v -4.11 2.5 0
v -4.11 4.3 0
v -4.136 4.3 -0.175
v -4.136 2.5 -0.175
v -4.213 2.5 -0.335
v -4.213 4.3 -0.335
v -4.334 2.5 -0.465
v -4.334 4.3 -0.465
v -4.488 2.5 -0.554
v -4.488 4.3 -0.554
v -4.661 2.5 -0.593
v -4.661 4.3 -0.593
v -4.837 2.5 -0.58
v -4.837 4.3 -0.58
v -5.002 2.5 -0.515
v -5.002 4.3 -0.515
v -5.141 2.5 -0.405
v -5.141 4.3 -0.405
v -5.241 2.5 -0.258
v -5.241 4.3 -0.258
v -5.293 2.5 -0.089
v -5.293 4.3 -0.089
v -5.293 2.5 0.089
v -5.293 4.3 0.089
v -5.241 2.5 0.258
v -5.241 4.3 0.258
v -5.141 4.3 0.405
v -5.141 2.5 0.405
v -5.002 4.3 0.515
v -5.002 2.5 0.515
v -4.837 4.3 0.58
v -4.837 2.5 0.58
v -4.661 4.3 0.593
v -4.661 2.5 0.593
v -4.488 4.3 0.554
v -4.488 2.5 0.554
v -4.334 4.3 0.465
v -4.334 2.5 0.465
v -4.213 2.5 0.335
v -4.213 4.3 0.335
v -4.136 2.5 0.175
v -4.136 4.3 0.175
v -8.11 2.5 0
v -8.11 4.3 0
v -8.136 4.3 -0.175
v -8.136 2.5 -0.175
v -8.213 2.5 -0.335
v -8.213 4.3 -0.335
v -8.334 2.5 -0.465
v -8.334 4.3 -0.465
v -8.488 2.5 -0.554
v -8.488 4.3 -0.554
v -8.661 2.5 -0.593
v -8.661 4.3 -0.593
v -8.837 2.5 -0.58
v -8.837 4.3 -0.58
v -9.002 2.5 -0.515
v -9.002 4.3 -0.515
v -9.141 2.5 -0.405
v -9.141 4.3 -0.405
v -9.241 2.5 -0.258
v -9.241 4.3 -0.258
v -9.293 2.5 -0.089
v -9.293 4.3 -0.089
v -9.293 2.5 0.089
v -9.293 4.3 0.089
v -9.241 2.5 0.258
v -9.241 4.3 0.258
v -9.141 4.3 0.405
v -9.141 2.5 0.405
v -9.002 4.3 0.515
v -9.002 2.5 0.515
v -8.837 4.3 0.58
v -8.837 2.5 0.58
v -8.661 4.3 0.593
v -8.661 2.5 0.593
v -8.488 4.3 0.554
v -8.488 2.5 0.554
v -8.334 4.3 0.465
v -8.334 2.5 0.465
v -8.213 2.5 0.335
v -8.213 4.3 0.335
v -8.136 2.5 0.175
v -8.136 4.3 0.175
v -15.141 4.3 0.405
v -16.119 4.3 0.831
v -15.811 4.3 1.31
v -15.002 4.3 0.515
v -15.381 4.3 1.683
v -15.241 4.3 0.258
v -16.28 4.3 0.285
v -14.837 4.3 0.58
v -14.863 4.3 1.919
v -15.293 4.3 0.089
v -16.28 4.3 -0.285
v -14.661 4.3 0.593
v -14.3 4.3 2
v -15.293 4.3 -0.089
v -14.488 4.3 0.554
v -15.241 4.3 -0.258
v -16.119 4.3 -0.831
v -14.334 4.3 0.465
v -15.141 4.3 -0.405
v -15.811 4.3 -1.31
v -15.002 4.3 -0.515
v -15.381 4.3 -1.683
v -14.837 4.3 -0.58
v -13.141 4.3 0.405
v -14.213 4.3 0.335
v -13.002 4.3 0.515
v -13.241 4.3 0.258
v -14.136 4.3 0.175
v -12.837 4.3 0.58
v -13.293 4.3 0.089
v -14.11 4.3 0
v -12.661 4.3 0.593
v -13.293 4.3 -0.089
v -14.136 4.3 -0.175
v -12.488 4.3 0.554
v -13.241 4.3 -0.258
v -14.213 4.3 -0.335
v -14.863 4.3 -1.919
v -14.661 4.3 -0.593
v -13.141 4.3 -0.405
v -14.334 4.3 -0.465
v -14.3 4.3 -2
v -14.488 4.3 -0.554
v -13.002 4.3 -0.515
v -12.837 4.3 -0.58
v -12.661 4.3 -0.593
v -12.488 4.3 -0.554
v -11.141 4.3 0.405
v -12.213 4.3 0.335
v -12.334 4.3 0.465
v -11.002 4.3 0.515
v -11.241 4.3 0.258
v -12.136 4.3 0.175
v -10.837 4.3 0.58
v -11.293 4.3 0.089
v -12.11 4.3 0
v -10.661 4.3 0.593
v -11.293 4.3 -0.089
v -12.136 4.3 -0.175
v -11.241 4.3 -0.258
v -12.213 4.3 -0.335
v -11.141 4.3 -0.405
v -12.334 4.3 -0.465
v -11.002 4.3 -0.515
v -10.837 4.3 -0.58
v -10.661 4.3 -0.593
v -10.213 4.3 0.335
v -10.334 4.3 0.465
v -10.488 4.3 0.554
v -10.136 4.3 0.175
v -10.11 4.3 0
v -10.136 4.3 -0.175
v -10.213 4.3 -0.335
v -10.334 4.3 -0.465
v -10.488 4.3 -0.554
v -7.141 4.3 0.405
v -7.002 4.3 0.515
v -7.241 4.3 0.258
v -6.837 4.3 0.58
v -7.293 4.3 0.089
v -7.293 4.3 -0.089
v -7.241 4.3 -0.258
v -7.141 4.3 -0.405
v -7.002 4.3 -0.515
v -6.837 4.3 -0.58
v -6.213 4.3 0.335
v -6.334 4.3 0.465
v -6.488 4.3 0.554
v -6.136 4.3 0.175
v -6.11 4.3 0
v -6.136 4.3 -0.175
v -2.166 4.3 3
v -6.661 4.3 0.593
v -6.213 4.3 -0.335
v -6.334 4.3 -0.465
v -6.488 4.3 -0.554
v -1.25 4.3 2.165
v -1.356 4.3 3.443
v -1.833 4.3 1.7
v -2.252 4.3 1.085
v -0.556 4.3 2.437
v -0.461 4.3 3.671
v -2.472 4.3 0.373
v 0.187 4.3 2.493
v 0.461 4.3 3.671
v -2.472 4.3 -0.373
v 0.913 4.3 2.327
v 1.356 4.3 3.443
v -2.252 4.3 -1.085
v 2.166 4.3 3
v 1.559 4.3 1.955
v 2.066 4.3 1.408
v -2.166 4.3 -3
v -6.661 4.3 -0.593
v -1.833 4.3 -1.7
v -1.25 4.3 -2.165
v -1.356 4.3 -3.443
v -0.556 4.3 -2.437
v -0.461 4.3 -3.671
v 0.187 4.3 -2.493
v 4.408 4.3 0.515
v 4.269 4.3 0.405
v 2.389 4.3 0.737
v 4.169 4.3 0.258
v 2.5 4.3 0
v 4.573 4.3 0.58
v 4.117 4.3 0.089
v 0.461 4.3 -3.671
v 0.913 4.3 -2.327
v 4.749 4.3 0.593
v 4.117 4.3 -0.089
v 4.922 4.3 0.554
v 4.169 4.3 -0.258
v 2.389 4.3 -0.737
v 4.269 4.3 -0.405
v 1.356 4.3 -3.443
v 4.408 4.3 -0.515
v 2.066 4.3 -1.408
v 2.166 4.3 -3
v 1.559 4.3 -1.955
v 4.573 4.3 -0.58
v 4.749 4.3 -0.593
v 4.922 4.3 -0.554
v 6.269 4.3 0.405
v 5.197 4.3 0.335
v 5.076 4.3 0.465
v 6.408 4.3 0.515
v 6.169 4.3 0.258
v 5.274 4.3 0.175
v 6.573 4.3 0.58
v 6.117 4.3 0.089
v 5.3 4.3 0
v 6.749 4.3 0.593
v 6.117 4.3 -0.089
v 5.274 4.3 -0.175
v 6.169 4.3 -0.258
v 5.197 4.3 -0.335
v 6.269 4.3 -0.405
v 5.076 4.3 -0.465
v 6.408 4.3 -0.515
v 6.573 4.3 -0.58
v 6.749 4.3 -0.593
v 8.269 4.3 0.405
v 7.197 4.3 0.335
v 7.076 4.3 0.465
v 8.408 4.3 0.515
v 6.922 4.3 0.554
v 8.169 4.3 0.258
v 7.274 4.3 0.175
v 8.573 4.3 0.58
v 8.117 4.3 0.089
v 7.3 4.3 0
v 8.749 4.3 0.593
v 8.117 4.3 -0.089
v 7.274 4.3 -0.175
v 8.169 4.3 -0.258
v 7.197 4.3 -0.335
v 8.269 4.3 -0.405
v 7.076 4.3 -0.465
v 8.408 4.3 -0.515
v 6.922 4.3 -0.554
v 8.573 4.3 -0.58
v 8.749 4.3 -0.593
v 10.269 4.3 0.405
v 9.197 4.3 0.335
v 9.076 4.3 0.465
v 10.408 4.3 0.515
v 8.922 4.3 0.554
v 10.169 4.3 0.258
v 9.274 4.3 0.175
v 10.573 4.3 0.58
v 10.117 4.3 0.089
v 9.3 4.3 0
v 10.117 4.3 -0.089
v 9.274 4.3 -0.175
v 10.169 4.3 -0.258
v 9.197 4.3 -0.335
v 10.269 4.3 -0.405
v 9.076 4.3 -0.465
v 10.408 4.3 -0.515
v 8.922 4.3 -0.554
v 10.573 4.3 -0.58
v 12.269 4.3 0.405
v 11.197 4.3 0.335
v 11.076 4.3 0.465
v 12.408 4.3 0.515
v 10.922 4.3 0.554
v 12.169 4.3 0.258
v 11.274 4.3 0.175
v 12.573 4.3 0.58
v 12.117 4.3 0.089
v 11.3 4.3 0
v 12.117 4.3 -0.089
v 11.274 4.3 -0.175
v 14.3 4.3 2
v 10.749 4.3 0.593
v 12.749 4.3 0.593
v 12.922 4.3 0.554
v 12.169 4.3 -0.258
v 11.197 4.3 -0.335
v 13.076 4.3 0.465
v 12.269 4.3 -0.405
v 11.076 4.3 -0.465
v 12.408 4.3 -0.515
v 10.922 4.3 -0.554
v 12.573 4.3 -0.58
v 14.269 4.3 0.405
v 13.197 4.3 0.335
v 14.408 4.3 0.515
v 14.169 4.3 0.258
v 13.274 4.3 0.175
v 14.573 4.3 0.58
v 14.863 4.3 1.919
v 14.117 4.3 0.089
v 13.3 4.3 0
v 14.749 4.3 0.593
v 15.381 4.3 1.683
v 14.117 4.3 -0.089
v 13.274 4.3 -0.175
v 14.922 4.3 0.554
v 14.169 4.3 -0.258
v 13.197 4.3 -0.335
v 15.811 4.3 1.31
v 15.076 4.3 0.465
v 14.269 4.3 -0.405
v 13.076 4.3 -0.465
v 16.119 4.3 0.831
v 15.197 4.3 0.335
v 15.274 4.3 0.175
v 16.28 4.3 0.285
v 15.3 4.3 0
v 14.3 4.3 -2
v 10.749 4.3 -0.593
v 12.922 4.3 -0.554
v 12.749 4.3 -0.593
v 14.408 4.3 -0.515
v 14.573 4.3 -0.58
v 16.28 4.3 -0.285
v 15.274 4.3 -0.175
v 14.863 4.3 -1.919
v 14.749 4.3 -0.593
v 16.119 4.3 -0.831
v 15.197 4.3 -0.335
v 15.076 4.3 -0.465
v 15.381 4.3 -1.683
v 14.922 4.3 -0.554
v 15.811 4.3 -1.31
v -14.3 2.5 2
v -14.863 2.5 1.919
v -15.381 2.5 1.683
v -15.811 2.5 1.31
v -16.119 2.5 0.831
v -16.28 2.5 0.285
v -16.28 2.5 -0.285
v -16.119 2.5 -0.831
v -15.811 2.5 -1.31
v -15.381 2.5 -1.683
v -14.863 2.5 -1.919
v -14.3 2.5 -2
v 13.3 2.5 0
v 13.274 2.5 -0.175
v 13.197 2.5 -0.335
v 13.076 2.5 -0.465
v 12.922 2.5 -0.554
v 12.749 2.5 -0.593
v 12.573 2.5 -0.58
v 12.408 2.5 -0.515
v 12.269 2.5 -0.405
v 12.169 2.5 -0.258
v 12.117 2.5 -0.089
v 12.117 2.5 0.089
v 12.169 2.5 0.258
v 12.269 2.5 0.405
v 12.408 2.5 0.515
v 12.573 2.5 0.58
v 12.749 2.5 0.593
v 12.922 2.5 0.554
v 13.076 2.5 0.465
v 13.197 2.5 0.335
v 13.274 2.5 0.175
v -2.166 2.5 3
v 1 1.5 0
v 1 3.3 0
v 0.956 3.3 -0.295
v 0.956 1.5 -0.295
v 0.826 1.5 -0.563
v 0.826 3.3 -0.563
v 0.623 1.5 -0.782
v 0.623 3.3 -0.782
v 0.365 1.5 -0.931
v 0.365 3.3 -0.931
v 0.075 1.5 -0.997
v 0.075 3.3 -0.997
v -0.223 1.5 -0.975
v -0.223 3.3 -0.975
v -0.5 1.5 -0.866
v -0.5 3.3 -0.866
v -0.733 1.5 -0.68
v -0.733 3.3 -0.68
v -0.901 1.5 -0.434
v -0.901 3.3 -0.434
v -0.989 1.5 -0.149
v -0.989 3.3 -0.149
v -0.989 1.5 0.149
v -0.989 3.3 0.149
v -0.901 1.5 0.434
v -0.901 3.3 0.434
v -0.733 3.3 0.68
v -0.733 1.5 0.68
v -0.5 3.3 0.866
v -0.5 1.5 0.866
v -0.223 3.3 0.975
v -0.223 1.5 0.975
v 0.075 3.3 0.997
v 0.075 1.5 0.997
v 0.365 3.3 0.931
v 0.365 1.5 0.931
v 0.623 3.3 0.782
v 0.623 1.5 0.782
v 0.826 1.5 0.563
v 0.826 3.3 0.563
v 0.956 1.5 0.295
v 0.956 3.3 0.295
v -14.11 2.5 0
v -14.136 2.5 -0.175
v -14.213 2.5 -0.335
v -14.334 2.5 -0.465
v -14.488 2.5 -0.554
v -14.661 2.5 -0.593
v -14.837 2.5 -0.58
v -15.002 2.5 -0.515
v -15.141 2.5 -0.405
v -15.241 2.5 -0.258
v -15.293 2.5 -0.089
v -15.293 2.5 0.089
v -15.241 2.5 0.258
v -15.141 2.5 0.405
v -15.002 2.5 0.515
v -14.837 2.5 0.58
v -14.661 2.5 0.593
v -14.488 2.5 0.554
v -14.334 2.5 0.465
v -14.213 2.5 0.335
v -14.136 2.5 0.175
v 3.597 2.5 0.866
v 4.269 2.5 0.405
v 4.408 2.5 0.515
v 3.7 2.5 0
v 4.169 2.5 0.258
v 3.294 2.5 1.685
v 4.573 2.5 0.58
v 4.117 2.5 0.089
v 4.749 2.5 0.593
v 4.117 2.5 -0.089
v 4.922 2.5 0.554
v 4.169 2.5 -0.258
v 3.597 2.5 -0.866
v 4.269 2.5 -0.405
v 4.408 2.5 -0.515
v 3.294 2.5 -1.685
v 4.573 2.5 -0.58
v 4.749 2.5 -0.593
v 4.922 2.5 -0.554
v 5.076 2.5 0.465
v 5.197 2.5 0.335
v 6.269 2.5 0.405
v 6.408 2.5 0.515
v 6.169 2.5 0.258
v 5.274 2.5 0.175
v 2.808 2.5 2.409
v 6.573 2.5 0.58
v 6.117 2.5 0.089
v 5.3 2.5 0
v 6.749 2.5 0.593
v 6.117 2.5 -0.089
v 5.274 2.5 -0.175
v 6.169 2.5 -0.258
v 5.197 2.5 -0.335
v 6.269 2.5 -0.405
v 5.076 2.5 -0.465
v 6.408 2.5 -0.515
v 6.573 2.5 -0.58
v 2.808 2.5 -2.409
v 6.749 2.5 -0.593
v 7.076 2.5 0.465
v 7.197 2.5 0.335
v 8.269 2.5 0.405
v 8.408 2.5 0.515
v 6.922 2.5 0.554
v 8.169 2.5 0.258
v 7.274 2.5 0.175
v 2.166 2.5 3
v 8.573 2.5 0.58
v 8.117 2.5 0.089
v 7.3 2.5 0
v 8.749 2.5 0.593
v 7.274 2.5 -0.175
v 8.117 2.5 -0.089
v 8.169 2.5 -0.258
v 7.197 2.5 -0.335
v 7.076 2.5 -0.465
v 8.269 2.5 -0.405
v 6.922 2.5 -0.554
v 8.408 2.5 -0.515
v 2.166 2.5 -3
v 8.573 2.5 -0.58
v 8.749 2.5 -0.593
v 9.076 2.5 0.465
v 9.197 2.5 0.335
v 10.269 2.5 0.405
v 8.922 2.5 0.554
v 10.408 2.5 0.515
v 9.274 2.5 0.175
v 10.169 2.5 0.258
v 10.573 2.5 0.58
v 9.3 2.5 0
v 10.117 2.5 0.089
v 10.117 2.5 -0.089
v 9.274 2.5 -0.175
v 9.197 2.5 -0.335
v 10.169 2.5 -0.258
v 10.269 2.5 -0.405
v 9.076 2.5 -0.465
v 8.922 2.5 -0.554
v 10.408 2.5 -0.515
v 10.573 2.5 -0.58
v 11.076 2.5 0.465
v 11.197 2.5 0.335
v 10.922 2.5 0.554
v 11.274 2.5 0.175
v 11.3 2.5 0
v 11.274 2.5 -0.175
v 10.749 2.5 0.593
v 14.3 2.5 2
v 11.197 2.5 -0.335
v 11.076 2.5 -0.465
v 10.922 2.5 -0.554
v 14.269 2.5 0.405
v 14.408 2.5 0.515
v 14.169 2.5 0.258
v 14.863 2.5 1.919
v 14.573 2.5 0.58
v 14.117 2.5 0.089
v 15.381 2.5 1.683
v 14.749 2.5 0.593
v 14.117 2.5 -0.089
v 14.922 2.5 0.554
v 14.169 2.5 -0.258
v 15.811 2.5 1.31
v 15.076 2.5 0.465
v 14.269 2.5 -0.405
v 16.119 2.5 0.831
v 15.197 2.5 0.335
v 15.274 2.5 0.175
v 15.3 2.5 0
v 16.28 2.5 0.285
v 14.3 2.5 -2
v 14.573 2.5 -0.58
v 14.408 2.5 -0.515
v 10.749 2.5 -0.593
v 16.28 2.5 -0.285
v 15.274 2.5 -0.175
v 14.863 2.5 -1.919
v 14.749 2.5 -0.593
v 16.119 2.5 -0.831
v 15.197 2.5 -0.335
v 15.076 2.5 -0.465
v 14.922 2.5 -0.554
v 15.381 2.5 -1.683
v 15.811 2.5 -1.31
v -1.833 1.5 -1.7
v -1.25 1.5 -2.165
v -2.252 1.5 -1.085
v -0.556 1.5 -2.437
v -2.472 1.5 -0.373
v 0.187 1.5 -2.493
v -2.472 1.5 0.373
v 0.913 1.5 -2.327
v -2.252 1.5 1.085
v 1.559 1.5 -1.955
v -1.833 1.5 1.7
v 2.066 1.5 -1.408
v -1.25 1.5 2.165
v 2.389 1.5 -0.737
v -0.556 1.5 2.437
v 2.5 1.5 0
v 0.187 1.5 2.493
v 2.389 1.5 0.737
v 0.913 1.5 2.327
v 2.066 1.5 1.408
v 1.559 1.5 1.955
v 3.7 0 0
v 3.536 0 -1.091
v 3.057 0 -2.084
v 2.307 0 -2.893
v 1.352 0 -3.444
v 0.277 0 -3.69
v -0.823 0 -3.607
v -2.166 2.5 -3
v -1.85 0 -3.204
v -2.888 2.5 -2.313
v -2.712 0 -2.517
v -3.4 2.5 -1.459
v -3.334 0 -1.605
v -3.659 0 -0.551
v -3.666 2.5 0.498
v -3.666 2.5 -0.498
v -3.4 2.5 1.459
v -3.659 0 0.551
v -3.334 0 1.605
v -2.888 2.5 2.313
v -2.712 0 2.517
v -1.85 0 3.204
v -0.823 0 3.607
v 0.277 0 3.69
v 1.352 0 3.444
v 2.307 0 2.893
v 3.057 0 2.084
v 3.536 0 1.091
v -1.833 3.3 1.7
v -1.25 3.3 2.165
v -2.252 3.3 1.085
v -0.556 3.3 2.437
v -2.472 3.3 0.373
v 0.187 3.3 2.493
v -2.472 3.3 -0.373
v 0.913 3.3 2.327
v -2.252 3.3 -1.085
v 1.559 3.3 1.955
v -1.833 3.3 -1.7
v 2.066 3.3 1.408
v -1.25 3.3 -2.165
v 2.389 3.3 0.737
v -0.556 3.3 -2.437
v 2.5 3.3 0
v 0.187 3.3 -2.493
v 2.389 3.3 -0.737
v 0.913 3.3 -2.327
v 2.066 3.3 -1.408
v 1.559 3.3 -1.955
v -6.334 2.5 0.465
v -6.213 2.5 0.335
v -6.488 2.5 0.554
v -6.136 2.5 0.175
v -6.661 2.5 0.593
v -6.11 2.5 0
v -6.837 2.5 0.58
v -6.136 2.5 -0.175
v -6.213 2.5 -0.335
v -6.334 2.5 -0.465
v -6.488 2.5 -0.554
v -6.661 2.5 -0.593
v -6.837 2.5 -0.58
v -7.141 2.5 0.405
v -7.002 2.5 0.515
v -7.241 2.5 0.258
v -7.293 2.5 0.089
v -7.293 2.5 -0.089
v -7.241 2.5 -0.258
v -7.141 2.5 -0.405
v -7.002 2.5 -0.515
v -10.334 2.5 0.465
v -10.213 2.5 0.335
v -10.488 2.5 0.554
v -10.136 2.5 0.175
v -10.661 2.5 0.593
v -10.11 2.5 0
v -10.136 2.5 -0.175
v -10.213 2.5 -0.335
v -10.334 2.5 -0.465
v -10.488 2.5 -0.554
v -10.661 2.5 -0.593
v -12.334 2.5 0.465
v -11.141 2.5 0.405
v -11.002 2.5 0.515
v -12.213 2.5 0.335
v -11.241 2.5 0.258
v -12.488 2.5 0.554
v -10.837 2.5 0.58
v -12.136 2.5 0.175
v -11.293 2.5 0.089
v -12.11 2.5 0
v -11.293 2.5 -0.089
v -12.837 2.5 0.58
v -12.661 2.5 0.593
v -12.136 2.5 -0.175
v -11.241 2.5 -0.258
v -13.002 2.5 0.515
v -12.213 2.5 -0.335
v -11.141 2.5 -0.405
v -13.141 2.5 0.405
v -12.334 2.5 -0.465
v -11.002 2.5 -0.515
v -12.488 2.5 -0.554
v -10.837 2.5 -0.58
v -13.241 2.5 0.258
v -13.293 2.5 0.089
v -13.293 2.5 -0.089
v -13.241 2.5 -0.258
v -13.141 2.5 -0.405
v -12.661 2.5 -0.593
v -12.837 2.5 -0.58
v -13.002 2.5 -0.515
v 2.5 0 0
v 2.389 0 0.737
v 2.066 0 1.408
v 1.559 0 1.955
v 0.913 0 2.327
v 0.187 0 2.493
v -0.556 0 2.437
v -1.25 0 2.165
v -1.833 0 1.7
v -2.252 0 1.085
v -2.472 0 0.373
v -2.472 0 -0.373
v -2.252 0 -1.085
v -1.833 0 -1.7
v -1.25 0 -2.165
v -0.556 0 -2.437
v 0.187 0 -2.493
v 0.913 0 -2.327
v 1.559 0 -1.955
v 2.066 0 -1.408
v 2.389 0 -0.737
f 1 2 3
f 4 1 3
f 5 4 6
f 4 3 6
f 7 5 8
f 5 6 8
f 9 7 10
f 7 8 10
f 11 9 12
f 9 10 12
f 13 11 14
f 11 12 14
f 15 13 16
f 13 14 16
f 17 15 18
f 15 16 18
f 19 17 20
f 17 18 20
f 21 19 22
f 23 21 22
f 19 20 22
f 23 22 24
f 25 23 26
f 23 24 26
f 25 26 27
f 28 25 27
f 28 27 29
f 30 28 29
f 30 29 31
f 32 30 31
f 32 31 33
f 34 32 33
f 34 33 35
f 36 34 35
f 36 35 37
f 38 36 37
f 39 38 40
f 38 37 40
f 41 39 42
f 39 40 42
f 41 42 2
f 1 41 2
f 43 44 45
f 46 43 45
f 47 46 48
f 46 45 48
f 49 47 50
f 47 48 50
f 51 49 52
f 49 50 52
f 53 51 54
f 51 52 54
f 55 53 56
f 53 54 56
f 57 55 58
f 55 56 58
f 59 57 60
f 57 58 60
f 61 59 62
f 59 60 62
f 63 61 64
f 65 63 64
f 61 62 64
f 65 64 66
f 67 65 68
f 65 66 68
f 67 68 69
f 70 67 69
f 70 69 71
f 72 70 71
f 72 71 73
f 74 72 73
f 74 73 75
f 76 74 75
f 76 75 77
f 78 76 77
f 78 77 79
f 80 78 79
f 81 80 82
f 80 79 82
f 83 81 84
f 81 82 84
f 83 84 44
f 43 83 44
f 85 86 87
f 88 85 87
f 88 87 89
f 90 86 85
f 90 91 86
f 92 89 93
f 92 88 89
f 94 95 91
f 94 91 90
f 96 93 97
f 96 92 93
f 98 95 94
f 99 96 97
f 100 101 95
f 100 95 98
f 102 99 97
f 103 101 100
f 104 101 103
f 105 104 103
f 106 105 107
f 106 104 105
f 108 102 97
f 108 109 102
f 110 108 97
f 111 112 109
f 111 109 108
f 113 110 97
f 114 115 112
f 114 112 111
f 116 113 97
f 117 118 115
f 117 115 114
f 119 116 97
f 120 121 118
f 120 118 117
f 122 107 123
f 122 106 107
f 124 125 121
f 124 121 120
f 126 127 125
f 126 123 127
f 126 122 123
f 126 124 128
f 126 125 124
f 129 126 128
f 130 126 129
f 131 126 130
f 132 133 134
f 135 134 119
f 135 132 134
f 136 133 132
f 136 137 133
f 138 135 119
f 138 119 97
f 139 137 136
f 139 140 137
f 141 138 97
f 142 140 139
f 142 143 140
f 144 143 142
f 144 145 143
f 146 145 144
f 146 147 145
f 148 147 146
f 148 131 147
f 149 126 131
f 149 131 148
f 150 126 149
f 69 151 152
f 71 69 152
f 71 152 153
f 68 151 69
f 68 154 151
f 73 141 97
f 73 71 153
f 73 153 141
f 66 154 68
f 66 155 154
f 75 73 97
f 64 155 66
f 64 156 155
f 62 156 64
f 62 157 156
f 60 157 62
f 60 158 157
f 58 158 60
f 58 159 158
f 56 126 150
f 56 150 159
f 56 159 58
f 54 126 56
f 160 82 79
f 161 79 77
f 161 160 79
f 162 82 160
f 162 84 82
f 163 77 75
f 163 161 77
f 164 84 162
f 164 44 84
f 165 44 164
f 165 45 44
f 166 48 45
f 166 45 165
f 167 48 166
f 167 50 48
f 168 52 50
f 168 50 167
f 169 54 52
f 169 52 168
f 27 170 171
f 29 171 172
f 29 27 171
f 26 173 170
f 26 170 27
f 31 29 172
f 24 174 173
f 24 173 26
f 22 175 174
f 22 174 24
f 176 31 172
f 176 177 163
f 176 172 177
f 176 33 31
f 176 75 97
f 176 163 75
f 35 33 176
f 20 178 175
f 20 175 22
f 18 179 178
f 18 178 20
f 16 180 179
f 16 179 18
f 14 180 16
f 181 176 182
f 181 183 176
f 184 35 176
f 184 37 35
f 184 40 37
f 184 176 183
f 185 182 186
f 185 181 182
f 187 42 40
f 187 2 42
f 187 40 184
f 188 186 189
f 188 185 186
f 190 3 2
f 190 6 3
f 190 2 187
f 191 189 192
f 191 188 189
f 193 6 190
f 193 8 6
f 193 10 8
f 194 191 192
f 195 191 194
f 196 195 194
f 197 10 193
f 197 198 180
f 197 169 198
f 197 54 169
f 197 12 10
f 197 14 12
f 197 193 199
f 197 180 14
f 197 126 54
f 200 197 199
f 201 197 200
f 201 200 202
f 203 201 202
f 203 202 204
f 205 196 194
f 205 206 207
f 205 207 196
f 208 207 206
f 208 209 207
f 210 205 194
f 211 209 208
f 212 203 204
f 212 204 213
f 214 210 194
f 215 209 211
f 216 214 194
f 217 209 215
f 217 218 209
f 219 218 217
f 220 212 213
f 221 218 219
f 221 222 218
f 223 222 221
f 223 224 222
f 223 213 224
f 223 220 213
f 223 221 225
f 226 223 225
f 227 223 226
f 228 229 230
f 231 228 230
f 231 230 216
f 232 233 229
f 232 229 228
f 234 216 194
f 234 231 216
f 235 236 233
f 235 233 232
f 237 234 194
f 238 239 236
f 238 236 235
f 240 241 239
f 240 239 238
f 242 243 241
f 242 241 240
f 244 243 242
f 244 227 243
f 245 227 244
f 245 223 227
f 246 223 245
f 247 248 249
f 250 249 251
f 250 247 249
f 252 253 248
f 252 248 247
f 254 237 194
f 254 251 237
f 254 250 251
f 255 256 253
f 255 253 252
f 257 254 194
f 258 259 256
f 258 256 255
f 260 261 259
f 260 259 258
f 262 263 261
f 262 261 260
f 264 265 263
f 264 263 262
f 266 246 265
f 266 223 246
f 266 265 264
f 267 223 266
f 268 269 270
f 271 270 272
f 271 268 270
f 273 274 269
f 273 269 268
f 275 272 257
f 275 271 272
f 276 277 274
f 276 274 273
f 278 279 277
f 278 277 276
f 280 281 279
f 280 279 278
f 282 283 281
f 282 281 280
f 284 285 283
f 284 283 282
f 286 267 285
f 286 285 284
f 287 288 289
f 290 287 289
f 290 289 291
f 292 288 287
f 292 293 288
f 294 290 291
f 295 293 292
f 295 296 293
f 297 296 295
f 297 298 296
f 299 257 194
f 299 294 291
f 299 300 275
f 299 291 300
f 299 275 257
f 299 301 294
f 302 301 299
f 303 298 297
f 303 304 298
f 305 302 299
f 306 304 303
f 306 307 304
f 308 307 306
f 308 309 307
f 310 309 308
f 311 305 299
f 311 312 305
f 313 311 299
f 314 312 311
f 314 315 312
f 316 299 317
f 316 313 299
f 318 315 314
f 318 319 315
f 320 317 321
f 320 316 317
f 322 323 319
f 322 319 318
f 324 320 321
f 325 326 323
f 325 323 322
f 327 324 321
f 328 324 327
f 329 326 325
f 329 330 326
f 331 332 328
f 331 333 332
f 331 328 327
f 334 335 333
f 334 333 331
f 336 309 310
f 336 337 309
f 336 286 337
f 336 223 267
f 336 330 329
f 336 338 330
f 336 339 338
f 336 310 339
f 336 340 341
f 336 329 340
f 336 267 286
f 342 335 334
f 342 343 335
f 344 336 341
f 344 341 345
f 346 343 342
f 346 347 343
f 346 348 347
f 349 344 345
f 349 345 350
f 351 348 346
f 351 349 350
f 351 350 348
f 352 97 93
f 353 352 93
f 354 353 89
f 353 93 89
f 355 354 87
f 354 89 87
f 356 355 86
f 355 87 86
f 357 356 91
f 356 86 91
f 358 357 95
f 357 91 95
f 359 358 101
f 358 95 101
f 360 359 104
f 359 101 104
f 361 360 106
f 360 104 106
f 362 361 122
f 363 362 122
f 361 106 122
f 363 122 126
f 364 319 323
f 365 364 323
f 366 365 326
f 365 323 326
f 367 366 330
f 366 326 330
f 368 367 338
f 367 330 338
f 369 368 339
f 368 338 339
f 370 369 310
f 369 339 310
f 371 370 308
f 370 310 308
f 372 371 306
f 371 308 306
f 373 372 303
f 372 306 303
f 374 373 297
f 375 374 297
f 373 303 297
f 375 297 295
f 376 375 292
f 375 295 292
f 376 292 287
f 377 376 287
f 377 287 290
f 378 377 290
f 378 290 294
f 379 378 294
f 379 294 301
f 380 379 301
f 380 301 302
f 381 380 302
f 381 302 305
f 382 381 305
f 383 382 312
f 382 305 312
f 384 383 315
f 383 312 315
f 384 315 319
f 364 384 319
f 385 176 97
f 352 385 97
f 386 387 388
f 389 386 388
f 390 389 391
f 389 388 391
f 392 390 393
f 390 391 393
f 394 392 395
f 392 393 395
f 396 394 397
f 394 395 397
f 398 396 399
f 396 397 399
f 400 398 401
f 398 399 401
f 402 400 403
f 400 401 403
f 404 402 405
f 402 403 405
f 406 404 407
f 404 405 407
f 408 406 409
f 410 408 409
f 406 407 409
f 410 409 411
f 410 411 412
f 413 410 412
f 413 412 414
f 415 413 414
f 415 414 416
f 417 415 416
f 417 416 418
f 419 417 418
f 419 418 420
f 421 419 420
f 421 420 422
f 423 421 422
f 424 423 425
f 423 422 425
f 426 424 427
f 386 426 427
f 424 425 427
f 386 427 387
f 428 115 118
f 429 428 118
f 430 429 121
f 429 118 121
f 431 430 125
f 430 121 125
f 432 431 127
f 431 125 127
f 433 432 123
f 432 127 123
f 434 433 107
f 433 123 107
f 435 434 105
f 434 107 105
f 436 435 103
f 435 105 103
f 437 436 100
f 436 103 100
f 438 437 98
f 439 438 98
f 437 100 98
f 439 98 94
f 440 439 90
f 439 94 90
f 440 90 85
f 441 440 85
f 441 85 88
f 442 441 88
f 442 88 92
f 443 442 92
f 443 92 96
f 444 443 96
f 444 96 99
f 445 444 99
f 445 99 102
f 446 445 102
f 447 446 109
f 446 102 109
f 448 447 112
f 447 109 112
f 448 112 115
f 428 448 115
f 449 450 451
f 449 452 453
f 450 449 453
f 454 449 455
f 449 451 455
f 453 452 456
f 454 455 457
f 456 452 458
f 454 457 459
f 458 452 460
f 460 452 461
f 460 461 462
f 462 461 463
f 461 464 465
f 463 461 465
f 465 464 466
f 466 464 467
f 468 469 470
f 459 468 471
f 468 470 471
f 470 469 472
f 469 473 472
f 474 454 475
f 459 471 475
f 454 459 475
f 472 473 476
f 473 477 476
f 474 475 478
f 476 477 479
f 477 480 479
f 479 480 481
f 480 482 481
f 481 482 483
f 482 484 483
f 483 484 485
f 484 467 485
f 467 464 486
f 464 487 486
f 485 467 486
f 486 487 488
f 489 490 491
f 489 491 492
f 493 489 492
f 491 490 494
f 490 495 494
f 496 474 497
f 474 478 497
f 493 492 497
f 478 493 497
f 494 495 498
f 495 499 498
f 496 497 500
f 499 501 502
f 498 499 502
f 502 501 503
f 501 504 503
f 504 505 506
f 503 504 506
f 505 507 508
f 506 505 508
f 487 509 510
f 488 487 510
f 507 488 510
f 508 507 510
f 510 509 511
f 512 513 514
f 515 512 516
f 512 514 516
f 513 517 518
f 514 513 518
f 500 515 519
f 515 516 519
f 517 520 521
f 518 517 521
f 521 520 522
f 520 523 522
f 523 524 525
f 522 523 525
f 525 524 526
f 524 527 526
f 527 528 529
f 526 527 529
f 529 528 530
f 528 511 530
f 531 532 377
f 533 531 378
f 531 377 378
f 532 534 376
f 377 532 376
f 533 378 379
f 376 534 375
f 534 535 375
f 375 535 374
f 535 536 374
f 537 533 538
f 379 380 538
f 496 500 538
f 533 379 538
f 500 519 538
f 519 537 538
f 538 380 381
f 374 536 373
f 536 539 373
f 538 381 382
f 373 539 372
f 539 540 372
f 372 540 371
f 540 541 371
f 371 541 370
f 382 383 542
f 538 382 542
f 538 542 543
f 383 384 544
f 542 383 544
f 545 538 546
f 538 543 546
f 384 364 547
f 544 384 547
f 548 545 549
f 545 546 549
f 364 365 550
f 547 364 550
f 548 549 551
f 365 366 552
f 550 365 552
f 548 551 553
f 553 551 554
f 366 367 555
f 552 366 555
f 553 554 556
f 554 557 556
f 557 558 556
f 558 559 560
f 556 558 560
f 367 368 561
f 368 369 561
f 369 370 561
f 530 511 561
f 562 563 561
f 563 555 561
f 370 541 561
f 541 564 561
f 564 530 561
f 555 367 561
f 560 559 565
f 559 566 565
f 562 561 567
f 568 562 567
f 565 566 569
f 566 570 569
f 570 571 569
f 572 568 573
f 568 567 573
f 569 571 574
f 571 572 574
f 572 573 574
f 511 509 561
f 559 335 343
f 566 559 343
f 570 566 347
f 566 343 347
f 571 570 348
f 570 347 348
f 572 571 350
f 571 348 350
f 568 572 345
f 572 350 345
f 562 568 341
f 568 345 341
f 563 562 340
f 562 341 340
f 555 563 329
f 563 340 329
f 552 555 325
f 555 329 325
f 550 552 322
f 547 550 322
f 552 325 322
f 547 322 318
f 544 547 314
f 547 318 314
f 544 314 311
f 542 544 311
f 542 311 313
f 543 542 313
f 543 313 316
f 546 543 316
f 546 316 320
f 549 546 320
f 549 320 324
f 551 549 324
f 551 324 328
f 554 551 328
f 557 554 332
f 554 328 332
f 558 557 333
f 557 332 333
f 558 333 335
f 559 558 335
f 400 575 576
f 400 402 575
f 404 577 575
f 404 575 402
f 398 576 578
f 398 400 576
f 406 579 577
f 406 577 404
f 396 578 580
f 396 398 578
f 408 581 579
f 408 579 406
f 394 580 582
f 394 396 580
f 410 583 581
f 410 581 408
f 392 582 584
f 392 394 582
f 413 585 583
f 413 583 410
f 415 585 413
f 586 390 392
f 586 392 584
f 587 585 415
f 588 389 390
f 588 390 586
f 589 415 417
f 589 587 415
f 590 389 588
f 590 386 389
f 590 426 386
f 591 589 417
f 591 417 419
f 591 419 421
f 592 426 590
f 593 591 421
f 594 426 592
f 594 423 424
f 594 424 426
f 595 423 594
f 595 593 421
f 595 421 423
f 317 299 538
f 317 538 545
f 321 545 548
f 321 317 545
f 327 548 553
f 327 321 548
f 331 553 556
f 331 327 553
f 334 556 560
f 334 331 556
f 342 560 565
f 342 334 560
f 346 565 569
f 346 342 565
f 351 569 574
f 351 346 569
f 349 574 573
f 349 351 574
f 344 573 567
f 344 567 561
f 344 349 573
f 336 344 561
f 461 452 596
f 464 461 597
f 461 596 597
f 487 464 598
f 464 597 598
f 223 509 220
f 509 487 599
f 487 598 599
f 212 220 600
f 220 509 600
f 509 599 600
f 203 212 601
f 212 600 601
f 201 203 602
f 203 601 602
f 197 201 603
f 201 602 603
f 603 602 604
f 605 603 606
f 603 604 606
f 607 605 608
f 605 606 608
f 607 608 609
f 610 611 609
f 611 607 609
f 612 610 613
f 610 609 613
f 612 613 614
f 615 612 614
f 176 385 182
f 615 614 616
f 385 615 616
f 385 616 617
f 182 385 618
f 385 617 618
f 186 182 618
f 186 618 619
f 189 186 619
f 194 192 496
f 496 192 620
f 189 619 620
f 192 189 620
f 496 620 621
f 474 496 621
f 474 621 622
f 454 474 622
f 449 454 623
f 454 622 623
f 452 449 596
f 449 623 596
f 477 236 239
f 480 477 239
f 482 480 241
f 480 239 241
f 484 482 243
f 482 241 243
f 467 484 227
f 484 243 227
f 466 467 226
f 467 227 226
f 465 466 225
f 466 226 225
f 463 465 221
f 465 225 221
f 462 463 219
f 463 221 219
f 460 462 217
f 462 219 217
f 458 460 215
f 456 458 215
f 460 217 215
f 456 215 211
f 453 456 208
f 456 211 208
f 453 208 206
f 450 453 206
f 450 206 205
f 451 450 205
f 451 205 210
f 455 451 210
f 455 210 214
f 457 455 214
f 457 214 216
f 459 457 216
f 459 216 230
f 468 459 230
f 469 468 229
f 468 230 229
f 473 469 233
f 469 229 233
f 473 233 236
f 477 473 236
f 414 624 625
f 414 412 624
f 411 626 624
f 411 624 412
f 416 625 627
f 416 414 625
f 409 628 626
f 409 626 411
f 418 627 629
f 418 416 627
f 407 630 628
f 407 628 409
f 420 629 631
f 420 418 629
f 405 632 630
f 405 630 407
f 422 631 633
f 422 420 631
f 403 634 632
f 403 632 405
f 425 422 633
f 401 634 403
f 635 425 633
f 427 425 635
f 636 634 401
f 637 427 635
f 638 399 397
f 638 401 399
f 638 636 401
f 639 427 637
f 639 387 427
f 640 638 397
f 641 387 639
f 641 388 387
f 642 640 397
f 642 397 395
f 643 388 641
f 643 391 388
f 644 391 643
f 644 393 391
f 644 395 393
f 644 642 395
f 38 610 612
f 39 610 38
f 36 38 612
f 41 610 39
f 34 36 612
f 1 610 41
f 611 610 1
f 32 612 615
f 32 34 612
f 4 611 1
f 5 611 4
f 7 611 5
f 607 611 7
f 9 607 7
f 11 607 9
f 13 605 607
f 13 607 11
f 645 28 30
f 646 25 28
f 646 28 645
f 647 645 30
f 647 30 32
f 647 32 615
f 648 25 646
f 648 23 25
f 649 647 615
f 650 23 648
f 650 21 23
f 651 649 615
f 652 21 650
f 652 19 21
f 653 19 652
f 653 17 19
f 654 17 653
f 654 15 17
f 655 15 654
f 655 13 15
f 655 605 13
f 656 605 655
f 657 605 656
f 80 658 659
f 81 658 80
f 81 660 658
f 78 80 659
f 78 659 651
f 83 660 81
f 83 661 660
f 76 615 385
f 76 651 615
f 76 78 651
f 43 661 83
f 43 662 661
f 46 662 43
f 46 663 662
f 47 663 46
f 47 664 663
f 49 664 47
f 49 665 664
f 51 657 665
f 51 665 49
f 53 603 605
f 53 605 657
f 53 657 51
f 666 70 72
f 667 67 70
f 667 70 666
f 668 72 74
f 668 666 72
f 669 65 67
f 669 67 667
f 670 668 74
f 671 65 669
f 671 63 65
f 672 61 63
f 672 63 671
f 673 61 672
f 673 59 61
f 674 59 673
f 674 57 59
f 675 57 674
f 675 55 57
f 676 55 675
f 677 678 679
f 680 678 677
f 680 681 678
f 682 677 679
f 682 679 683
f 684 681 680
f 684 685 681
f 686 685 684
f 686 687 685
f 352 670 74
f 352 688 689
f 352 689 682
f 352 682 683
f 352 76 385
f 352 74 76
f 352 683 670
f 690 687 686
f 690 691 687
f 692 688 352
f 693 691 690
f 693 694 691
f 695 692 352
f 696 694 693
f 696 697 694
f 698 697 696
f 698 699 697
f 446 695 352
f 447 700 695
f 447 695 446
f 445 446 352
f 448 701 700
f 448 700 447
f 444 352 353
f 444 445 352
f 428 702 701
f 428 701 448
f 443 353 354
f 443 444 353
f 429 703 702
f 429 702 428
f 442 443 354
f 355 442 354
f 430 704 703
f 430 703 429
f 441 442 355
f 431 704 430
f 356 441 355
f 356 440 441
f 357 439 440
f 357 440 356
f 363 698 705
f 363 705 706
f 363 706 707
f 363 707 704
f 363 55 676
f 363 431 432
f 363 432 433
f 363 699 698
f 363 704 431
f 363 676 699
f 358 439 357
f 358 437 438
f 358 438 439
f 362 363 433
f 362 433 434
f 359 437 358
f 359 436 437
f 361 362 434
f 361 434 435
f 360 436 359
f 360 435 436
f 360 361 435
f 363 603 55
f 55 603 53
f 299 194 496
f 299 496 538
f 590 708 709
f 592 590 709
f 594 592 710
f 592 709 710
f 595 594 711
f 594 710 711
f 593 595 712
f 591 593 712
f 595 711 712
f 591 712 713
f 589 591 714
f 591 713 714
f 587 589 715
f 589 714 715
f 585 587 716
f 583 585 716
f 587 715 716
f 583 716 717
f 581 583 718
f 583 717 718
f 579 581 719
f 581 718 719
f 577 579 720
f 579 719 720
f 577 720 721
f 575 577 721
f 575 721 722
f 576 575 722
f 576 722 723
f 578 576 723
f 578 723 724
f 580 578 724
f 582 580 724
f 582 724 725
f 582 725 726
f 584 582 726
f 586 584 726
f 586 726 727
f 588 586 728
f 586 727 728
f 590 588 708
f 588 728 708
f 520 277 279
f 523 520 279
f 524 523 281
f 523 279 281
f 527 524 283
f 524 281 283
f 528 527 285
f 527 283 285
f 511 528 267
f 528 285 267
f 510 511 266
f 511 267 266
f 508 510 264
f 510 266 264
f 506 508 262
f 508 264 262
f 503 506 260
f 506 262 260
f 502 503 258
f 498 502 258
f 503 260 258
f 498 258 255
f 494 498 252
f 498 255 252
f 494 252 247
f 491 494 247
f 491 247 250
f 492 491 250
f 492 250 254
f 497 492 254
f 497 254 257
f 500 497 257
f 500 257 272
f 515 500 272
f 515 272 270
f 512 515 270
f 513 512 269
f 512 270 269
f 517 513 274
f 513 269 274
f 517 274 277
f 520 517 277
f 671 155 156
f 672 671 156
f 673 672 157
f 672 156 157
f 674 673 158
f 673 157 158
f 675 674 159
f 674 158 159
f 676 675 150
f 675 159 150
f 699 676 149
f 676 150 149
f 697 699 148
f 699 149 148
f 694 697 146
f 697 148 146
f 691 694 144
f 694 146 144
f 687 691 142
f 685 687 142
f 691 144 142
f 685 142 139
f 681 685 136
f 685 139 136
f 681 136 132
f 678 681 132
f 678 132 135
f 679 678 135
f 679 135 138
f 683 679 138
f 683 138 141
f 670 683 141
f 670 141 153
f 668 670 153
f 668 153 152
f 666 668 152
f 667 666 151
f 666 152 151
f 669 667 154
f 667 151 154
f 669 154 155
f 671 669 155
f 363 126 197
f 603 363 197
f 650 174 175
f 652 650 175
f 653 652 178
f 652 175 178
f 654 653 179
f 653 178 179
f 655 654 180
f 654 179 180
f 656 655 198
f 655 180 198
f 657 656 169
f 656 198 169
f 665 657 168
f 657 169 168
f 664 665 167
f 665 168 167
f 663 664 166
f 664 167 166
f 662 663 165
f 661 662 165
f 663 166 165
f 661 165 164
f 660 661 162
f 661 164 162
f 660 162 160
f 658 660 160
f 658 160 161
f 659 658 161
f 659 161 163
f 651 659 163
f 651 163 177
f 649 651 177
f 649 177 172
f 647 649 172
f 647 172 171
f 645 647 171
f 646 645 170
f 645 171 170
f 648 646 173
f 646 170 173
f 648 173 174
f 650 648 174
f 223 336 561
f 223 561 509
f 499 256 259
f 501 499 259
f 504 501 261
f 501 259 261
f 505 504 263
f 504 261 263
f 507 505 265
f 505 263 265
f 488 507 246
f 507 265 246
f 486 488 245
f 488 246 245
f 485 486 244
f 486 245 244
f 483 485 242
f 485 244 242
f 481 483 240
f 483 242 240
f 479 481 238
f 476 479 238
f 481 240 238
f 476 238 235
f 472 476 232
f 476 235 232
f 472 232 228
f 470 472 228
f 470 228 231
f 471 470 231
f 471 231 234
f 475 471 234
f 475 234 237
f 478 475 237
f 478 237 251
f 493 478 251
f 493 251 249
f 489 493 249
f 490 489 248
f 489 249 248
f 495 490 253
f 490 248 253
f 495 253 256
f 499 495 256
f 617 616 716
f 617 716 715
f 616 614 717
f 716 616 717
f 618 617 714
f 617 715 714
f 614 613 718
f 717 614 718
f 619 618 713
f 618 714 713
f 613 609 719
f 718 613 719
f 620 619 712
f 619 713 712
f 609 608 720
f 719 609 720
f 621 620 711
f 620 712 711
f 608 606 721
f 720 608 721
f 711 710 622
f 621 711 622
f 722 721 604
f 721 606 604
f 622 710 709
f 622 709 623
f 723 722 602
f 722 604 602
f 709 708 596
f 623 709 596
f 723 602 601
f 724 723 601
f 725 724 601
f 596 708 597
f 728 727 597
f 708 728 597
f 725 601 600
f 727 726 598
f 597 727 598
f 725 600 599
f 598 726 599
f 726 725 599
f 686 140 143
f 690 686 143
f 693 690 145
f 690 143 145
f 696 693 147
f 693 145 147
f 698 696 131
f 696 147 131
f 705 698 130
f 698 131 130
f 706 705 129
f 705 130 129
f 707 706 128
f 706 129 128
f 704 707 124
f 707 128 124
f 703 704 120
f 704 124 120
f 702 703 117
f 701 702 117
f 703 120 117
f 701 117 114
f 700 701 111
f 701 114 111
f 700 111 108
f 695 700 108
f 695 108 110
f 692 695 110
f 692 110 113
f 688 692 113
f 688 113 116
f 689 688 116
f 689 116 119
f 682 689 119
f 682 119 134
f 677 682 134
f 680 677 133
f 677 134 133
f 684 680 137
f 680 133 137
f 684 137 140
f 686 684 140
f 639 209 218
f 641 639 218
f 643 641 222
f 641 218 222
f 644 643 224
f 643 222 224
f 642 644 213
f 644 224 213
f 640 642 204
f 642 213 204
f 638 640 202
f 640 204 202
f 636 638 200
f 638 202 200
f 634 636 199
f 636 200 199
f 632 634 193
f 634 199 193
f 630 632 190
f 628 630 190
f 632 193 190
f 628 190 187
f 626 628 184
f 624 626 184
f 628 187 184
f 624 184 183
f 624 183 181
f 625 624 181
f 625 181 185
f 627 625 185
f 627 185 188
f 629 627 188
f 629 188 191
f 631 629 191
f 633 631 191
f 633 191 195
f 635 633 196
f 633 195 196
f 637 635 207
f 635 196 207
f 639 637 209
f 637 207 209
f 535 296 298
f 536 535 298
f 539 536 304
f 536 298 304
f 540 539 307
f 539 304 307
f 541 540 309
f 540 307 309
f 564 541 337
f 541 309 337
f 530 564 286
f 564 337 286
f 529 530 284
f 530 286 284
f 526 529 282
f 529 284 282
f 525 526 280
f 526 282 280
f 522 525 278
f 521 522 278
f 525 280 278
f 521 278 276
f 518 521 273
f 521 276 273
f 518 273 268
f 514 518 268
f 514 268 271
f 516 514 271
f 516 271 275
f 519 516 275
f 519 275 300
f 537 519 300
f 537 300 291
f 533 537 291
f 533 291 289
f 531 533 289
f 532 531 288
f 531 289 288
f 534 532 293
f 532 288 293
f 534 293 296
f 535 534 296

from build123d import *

# Parameters (mm, degrees)
CROQUIS1_R              = 3.7
SALIENTE_EXTRUIR2_DEPTH = 4.3
CROQUIS2_R              = 2.5
CORTAR_EXTRUIR1_DEPTH   = 1.5
CROQUIS3_R              = 2.5
CORTAR_EXTRUIR2_DEPTH   = 1
CROQUIS4_R              = 1
CORTAR_EXTRUIR3_DEPTH   = 1.8
SALIENTE_EXTRUIR3_DEPTH = 1.8
CROQUIS6_R              = 0.595
CORTAR_EXTRUIR4_DEPTH   = 1.8


with BuildPart() as part:
    # Croquis1 → Saliente-Extruir2 (new body)
    with BuildSketch(Plane(origin=(0, 0, 0), x_dir=(1, 0, 0), z_dir=(0, 1, 0))):
        Circle(CROQUIS1_R)
    extrude(amount=SALIENTE_EXTRUIR2_DEPTH)

    # Croquis2 → Cortar-Extruir1 (cut)
    with BuildSketch(Plane.XZ):
        Circle(CROQUIS2_R)
    extrude(amount=-CORTAR_EXTRUIR1_DEPTH, mode=Mode.SUBTRACT)

    # Croquis3 → Cortar-Extruir2 (cut)
    with BuildSketch(Plane(origin=(0, 4.3, 0), x_dir=(1, 0, 0), z_dir=(0, 1, 0))):
        Circle(CROQUIS3_R)
    extrude(amount=-CORTAR_EXTRUIR2_DEPTH, mode=Mode.SUBTRACT)

    # Croquis4 → Cortar-Extruir3 (cut)
    with BuildSketch(Plane(origin=(0, 3.3, 0), x_dir=(1, 0, 0), z_dir=(0, 1, 0))):
        Circle(CROQUIS4_R)
    extrude(amount=-CORTAR_EXTRUIR3_DEPTH, mode=Mode.SUBTRACT)

    # Croquis5 → Saliente-Extruir3 (add)
    with BuildSketch(Plane(origin=(0, 4.3, 0), x_dir=(1, 0, 0), z_dir=(0, 1, 0))):
        with BuildLine():
            Line((-2.16564, 3.000000565), (-3.120237459, 0))
            Line((-3.120237459, 0), (-2.16564, -3.000000565))
            Line((-2.16564, -3.000000565), (-14.3, -2))
            ThreePointArc((-14.3, -2), (-16.3, 0), (-14.3, 2))
            Line((-14.3, 2), (-2.16564, 3.000000565))
        make_face()
        with BuildLine():
            Line((3.120237459, 0), (2.16564, -3.000000565))
            Line((2.16564, -3.000000565), (14.3, -2))
            ThreePointArc((14.3, -2), (16.3, 0), (14.3, 2))
            Line((14.3, 2), (2.16564, 3.000000565))
            Line((2.16564, 3.000000565), (3.120237459, 0))
        make_face()
    extrude(amount=-SALIENTE_EXTRUIR3_DEPTH)

    # Croquis6 → Cortar-Extruir4 (cut)
    with BuildSketch(Plane(origin=(0, 4.3, 0), x_dir=(1, 0, 0), z_dir=(0, 1, 0))):
        with Locations((-14.705, 0)):
            Circle(CROQUIS6_R)
        with Locations((-12.705, 0)):
            Circle(CROQUIS6_R)
        with Locations((-10.705, 0)):
            Circle(CROQUIS6_R)
        with Locations((-8.705, 0)):
            Circle(CROQUIS6_R)
        with Locations((-6.705, 0)):
            Circle(CROQUIS6_R)
        with Locations((-4.705, 0)):
            Circle(CROQUIS6_R)
        with Locations((14.705, 0)):
            Circle(CROQUIS6_R)
        with Locations((12.705, 0)):
            Circle(CROQUIS6_R)
        with Locations((10.705, 0)):
            Circle(CROQUIS6_R)
        with Locations((8.705, 0)):
            Circle(CROQUIS6_R)
        with Locations((6.705, 0)):
            Circle(CROQUIS6_R)
        with Locations((4.705, 0)):
            Circle(CROQUIS6_R)
    extrude(amount=-CORTAR_EXTRUIR4_DEPTH, mode=Mode.SUBTRACT)


solid = part.part
